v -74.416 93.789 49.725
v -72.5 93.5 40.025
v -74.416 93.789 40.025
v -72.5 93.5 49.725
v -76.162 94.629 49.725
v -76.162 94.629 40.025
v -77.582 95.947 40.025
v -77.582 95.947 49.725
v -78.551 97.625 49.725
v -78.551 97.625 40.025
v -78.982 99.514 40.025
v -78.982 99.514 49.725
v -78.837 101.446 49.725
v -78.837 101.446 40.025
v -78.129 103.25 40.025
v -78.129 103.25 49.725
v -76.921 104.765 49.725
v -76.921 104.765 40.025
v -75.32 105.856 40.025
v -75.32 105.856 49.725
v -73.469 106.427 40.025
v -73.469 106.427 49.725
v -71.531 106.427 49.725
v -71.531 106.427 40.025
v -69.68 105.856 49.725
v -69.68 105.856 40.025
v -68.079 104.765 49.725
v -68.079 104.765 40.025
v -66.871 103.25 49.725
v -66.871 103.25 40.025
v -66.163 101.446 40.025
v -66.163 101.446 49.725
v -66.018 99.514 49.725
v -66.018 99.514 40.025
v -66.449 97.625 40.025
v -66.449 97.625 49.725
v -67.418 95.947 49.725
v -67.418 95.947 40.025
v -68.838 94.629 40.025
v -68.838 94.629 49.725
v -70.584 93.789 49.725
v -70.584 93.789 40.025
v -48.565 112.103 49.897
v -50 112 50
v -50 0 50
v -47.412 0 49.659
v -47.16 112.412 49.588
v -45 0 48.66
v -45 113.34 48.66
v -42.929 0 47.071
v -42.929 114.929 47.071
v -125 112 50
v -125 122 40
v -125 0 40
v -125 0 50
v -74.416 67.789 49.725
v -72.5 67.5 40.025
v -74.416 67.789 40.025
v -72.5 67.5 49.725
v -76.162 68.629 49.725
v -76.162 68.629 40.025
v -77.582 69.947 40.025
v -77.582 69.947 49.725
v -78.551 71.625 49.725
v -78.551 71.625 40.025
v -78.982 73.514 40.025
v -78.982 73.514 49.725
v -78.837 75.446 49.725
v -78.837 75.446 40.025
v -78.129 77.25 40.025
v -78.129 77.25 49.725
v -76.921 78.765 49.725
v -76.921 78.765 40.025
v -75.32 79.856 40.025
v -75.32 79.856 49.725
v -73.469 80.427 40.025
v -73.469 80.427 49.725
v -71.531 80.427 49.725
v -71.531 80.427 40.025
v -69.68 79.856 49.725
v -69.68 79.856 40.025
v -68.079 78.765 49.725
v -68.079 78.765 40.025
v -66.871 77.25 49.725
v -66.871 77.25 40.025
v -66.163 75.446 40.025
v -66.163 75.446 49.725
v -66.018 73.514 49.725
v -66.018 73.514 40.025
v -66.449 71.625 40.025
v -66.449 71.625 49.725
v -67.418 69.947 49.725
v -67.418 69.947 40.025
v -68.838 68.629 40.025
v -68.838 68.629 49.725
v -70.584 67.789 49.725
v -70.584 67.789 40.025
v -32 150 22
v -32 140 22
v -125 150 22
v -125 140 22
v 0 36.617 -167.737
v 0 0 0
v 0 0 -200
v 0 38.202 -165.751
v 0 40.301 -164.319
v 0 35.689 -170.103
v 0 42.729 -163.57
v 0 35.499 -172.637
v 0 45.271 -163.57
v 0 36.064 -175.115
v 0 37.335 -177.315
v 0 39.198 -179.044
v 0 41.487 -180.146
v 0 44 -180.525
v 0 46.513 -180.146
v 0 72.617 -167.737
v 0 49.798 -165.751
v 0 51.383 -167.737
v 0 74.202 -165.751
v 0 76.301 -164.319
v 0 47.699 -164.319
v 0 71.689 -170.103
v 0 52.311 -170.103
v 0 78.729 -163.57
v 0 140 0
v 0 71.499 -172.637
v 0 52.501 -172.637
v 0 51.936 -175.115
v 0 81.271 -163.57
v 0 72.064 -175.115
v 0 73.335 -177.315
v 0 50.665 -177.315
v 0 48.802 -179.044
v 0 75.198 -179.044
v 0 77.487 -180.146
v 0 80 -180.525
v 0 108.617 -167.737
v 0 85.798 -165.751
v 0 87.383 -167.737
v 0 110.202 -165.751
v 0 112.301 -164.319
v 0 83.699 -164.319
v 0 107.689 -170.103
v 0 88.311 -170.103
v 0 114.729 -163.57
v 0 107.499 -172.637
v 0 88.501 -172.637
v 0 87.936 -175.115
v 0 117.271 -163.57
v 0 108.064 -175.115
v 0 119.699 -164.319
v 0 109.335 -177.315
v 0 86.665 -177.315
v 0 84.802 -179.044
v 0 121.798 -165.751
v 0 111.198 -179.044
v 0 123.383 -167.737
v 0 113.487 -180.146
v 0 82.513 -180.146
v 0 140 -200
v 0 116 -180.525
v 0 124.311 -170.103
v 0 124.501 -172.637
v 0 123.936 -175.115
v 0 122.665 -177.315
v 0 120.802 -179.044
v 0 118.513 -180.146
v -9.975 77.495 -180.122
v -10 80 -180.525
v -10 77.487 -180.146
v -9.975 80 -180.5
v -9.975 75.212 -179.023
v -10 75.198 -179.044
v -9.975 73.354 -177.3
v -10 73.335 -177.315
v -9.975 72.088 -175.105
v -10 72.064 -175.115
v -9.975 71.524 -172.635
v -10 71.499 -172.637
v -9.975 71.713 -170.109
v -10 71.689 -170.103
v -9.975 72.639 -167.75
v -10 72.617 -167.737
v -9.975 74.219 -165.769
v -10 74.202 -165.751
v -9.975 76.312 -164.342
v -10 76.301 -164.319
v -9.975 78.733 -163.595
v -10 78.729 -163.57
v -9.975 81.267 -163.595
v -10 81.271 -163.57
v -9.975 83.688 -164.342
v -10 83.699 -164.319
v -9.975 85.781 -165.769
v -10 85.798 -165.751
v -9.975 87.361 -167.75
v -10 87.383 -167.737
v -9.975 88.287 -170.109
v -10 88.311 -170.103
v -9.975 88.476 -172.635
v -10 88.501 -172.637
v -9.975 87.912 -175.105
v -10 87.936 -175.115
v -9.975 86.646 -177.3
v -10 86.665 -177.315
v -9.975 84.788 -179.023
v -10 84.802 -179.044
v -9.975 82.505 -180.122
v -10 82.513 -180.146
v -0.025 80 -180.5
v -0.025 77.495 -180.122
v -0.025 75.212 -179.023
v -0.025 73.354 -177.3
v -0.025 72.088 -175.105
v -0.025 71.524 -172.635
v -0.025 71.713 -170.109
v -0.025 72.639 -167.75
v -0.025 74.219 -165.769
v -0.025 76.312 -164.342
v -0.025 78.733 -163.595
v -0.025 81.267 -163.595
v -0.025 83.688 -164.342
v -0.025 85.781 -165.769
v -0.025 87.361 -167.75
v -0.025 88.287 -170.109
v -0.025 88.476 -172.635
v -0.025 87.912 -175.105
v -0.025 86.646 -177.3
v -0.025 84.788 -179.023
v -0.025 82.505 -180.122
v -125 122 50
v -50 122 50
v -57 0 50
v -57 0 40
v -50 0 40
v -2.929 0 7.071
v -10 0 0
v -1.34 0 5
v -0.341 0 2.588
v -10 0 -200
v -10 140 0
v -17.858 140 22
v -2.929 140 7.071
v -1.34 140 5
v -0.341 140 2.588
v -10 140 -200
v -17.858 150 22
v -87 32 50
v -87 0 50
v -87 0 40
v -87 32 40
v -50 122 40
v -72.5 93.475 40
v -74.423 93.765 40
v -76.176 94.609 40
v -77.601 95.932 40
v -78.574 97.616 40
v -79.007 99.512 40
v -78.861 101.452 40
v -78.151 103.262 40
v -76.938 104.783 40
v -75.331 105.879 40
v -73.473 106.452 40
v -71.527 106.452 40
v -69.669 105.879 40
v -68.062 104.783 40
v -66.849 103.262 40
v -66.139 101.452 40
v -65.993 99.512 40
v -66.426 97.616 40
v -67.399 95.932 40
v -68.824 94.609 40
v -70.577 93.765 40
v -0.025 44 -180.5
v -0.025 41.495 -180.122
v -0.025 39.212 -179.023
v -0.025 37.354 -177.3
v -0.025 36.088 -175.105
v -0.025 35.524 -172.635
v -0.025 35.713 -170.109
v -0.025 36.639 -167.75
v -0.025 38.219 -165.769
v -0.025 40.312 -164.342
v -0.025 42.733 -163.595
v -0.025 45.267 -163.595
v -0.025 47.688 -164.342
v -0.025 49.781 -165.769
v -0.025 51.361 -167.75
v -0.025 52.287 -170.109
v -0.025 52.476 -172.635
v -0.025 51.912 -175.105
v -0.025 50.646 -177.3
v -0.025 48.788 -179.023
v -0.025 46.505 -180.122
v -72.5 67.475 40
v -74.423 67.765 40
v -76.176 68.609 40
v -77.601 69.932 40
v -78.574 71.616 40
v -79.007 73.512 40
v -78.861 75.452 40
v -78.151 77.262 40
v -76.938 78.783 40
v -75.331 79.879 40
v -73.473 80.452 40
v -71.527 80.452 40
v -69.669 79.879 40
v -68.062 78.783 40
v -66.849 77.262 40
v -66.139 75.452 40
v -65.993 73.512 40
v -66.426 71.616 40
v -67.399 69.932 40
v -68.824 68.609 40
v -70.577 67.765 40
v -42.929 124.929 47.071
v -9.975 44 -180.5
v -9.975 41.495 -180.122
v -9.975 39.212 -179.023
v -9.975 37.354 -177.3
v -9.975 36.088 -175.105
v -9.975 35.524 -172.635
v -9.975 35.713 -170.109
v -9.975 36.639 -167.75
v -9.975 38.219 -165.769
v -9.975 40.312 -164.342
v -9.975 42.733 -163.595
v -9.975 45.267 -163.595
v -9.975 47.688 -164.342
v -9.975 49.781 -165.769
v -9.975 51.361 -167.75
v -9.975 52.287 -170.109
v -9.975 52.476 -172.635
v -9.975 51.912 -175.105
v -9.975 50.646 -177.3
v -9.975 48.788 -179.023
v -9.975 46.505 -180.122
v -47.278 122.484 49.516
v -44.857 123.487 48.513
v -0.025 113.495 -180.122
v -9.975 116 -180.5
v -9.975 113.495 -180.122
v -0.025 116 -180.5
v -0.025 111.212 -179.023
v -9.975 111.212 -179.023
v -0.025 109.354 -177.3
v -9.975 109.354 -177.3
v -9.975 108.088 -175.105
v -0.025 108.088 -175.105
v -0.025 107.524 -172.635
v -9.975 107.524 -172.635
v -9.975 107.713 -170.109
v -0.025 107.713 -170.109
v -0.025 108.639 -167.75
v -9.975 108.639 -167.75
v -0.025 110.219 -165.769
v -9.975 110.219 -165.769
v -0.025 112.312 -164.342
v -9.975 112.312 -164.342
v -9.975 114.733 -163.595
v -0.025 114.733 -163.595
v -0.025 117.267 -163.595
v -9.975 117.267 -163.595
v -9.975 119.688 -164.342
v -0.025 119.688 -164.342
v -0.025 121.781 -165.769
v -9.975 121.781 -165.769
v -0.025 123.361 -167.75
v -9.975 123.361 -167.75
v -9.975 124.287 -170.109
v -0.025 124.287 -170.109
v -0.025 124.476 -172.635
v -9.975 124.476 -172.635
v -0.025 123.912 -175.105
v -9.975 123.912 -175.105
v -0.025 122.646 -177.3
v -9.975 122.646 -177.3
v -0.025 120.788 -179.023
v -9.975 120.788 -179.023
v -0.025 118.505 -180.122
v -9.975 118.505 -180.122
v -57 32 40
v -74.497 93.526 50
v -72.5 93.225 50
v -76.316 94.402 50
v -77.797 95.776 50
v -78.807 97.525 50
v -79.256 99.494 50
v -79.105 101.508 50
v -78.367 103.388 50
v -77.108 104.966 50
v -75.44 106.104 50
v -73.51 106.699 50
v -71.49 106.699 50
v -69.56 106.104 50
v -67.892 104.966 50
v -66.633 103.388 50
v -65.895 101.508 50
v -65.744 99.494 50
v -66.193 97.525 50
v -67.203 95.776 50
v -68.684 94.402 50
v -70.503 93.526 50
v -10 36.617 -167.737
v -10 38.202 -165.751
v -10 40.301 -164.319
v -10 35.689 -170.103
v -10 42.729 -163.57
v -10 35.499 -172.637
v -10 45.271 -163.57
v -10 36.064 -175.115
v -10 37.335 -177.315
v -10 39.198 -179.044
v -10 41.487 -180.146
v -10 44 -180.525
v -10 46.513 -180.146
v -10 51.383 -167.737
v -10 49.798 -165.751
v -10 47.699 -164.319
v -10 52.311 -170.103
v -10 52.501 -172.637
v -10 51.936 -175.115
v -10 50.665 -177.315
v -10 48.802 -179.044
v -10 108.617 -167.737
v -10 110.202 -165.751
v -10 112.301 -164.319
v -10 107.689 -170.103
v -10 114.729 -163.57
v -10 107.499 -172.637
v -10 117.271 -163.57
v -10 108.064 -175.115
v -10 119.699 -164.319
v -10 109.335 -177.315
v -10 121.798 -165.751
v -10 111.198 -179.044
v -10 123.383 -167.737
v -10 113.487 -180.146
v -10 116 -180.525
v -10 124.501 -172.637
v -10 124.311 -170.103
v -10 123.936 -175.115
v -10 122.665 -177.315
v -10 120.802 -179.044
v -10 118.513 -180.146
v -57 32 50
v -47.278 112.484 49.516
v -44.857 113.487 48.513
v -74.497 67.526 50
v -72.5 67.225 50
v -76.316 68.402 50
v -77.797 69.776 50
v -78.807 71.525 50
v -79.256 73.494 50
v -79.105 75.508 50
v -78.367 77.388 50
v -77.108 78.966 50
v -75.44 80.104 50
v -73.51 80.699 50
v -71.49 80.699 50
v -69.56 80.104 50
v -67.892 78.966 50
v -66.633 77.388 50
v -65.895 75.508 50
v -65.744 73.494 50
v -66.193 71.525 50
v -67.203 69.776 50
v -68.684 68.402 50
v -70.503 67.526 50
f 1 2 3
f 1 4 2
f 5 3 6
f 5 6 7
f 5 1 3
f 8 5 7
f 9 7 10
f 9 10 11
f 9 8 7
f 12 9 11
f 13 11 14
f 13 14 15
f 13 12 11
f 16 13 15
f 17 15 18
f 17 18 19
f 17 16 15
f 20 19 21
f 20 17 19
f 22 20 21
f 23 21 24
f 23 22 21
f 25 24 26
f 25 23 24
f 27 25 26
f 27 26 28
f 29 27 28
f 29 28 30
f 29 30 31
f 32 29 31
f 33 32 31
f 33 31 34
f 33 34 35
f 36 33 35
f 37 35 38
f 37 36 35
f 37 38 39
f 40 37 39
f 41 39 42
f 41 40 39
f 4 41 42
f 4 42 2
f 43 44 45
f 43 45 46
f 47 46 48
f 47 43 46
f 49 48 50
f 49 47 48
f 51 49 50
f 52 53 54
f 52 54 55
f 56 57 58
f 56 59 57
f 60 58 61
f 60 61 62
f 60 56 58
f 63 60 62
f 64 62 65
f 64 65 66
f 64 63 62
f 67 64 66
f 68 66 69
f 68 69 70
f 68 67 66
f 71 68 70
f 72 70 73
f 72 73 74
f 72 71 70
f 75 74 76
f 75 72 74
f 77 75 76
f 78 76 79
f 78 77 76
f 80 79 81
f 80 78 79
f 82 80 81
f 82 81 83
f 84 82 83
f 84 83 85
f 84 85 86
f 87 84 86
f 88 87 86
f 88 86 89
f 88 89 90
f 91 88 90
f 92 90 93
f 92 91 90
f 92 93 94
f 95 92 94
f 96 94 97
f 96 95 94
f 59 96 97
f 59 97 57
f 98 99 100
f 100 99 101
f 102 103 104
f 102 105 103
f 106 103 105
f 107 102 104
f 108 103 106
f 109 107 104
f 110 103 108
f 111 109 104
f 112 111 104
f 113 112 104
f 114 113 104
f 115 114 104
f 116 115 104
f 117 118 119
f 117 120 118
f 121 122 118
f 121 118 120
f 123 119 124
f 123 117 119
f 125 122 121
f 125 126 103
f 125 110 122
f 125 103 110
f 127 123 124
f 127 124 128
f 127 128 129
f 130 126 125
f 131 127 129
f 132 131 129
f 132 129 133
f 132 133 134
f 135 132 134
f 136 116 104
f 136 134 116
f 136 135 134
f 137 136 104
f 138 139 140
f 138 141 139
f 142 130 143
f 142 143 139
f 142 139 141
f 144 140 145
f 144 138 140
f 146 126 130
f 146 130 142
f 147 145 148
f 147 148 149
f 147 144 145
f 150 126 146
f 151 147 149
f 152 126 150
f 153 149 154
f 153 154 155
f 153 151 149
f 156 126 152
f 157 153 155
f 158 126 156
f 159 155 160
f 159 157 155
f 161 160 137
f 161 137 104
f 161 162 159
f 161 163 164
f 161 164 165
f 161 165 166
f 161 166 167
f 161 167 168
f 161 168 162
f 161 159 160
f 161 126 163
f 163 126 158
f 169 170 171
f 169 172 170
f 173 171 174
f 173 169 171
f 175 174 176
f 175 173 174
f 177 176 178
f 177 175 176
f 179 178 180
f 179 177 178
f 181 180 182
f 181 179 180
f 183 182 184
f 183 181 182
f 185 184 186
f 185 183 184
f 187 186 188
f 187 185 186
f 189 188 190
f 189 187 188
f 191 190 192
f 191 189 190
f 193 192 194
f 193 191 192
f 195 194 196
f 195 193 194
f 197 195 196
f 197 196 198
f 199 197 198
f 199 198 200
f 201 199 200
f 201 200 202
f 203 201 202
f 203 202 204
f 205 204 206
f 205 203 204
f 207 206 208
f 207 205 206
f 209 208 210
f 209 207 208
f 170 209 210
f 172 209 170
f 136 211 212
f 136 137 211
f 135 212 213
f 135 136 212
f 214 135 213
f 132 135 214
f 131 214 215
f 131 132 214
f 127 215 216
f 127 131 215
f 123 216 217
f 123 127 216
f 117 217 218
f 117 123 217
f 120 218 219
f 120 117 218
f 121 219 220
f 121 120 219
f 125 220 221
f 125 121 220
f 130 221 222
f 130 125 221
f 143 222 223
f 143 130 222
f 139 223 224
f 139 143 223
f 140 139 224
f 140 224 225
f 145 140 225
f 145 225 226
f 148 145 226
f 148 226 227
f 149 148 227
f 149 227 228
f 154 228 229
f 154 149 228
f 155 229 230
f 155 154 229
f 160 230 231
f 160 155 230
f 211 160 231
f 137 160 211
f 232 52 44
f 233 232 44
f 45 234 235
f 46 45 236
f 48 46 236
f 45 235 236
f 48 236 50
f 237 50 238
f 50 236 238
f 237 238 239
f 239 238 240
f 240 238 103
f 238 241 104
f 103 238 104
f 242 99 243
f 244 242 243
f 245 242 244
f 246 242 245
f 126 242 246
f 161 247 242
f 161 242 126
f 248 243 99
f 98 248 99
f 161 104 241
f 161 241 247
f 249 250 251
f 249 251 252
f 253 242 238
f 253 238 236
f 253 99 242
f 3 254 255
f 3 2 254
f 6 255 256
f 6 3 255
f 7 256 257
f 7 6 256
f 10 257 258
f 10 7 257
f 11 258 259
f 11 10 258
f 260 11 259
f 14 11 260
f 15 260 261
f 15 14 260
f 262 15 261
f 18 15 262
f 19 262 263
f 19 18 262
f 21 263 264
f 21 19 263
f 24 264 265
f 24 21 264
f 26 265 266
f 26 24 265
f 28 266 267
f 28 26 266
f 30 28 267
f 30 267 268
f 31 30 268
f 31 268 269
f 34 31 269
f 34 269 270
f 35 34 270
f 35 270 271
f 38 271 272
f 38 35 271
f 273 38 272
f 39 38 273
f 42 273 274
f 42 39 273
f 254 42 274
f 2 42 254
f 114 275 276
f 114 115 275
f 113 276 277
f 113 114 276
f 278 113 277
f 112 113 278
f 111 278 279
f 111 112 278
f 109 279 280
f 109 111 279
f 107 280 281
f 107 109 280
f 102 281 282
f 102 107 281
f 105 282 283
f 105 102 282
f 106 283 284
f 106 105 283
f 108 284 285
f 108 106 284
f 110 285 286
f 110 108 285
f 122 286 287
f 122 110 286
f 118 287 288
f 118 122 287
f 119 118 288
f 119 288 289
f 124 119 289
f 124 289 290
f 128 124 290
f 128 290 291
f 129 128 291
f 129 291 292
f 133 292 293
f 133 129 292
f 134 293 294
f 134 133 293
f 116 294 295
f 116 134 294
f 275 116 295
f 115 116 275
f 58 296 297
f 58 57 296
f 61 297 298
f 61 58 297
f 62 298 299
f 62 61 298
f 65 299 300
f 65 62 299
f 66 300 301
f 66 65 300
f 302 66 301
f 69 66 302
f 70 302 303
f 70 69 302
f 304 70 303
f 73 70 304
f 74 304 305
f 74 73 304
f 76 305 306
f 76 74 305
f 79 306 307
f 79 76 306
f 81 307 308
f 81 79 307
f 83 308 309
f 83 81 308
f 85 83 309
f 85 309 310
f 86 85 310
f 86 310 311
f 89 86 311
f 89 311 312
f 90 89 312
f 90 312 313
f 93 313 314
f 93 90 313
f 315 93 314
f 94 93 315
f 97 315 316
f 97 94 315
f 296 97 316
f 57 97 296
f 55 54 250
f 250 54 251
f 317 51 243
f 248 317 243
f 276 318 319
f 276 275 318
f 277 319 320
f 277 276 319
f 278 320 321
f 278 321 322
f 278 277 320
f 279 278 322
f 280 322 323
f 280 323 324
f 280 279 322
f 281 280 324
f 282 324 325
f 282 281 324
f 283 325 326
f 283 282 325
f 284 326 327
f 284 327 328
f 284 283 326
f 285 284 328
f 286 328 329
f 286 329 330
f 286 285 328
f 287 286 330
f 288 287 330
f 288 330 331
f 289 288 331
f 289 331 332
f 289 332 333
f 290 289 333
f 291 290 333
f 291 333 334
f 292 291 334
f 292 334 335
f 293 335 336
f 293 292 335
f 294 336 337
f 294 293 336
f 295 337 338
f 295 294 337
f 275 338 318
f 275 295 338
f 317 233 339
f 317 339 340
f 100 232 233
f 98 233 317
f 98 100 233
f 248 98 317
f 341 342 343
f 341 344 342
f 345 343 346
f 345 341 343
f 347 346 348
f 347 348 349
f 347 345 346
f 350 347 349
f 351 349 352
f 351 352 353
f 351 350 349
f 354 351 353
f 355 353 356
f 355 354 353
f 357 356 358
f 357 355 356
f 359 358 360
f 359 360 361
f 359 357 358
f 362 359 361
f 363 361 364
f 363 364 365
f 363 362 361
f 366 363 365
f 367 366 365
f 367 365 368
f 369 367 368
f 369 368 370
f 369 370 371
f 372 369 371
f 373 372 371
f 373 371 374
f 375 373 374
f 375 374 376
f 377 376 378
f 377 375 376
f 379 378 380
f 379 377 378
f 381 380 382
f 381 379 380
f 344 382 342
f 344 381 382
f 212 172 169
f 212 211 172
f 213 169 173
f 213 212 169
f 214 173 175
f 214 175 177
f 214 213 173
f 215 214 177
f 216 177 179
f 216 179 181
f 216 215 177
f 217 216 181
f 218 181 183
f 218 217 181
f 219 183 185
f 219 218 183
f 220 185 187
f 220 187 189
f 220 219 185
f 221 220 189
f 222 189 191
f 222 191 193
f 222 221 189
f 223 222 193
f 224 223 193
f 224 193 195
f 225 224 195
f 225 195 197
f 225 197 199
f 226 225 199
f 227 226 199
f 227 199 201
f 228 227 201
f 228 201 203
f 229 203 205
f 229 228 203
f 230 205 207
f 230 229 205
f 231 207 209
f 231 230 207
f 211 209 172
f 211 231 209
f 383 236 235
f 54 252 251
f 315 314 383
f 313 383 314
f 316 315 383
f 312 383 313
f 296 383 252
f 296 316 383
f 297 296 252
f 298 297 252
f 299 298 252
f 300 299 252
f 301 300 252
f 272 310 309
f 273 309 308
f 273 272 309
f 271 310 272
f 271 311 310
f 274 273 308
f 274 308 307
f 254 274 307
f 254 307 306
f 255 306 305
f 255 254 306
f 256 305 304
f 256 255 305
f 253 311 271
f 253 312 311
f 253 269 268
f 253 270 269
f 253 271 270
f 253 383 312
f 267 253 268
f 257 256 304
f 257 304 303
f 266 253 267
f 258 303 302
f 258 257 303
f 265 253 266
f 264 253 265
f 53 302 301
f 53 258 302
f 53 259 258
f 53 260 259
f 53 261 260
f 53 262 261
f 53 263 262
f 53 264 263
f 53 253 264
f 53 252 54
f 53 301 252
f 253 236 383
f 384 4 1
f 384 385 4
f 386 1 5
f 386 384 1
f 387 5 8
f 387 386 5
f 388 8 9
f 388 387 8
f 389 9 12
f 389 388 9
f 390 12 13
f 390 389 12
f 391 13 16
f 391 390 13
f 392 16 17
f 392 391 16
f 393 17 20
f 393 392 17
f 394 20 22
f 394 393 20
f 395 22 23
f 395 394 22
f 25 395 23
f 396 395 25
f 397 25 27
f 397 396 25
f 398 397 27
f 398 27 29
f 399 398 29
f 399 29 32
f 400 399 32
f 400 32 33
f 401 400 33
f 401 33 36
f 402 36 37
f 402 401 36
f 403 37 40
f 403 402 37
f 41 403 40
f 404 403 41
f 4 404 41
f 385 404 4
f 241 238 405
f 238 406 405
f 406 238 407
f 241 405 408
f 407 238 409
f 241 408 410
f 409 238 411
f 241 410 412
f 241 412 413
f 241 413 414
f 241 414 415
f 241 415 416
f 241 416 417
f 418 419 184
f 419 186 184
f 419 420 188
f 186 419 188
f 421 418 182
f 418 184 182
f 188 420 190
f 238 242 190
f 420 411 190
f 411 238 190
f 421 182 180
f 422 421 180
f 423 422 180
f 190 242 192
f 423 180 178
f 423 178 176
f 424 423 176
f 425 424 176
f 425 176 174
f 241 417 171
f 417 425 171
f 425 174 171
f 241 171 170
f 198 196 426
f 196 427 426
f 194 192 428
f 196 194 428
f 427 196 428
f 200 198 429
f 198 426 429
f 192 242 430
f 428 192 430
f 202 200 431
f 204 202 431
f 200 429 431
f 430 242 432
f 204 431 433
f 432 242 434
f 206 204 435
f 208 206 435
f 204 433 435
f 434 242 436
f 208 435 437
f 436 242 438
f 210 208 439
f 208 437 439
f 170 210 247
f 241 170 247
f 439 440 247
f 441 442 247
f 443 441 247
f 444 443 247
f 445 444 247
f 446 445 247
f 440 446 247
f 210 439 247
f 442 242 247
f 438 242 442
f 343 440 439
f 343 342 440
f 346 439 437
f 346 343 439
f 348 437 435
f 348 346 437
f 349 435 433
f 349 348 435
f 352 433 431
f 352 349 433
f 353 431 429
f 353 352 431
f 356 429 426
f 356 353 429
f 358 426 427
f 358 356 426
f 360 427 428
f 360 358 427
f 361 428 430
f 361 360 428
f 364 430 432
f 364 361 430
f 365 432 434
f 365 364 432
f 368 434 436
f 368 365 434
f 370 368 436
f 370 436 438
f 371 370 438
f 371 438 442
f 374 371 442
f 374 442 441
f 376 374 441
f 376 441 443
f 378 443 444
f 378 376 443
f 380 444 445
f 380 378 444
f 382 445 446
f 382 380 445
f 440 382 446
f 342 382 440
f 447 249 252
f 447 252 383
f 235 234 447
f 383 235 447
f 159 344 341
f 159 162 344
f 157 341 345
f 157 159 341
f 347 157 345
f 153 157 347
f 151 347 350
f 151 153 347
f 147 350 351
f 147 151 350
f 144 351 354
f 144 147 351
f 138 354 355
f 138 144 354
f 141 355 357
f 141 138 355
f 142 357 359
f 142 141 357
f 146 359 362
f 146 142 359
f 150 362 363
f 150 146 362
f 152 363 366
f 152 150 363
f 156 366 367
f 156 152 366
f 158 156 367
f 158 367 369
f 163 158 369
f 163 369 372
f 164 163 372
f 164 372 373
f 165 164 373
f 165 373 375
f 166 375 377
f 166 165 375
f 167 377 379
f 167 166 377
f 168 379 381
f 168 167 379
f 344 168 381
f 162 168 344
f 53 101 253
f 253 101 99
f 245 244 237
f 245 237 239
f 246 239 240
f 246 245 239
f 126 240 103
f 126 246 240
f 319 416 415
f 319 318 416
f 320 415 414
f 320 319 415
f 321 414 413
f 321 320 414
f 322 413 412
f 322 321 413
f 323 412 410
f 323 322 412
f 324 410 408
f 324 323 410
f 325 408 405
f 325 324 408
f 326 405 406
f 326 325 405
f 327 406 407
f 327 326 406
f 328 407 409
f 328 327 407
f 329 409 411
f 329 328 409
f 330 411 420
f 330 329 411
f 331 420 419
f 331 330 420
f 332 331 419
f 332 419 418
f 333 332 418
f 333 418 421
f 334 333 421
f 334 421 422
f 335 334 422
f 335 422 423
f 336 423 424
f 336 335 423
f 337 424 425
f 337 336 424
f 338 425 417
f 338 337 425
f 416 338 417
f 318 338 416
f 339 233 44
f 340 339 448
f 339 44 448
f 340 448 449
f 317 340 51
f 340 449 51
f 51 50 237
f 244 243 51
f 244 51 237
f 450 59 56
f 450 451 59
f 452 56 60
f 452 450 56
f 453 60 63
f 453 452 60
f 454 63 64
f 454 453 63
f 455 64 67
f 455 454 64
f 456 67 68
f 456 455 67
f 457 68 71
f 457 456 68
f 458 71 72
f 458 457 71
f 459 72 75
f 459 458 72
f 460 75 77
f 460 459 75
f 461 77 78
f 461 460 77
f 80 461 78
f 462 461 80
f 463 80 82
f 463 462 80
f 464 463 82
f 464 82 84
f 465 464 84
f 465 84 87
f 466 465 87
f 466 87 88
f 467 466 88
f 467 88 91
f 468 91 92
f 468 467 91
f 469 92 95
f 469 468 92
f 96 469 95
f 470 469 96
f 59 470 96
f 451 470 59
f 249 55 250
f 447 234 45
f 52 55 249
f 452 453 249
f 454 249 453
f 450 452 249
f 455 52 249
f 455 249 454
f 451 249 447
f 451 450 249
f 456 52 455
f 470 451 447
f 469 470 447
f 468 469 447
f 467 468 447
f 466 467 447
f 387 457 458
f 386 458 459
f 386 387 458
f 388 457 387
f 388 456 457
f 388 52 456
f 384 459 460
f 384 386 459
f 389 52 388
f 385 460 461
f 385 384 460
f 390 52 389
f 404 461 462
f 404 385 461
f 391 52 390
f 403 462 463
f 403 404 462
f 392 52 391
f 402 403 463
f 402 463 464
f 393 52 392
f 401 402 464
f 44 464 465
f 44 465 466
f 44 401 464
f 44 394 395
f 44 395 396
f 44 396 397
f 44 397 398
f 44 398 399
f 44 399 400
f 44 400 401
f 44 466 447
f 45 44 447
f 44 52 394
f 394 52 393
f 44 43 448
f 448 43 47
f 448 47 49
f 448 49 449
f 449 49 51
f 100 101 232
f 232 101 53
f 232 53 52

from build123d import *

# Parameters (mm, degrees)
ESBO_O15_W                        = 200
ESBO_O15_H                        = 140
FLANGE_BASE3_DEPTH                = 10
RESSALTO_EXTRUS_O3_DEPTH          = 140
CORTE_EXTRUS_O1_DEPTH             = 275.271763038
ESBO_O29_W                        = 30
ESBO_O29_H                        = 32
CORTE_EXTRUS_O2_DEPTH             = 313.609980647
FURO_COM_FOLGA_DE_M121_AT_2_COUNT = 2
FURO_COM_FOLGA_DE_M121_AT_2_PITCH = 26
RESSALTO_EXTRUS_O4_DEPTH          = 10
FURO_COM_FOLGA_DE_M161_AT_2_COUNT = 2
FURO_COM_FOLGA_DE_M161_AT_2_PITCH = 36
FURO_COM_FOLGA_DE_M161_AT_3_COUNT = 2
FURO_COM_FOLGA_DE_M161_AT_3_PITCH = 72


# Sheet-metal steps are written as plain solids
with BuildPart() as part:
    # Esboço15 → Flange-base3 (new body)
    with BuildSketch(Plane(origin=(0, 0, 0), x_dir=(0, 0, -1), z_dir=(1, 0, 0))):
        with Locations((100, 70)):
            Rectangle(ESBO_O15_W, ESBO_O15_H)
    extrude(amount=-FLANGE_BASE3_DEPTH)

    # Esboço22 → Ressalto-extrusão3 (add)
    with BuildSketch(Plane(origin=(0, 140, 0), x_dir=(1, 0, 0), z_dir=(0, 1, 0))):
        with BuildLine():
            Line((-10, 0), (-50, -40))
            Line((-50, -40), (-125, -40))
            Line((-125, -40), (-125, -50))
            Line((-125, -50), (-50, -50))
            ThreePointArc((-50, -50), (-46.173165676, -49.238795325), (-42.928932188, -47.071067812))
            Line((-42.928932188, -47.071067812), (-2.928932188, -7.071067812))
            ThreePointArc((-2.928932188, -7.071067812), (-0.761204675, -3.826834324), (0, 0))
            Line((0, 0), (-10, 0))
        make_face()
    extrude(amount=-RESSALTO_EXTRUS_O3_DEPTH)

    # Esboço28 → Corte-extrusão1 (cut, through all)
    with BuildSketch(Plane(origin=(0, 0, 0), x_dir=(0, 0, -1), z_dir=(1, 0, 0))):
        Polygon((-40, 122), (-22, 140), (-40, 140), (-50, 140), (-50, 112), align=None)
    extrude(amount=-CORTE_EXTRUS_O1_DEPTH, mode=Mode.SUBTRACT)

    # Esboço29 → Corte-extrusão2 (cut, through all)
    with BuildSketch(Plane.XY.offset(50)):
        with Locations((-72, 16)):
            Rectangle(ESBO_O29_W, ESBO_O29_H)
    extrude(amount=-CORTE_EXTRUS_O2_DEPTH, mode=Mode.SUBTRACT)

    # Esboço32 → Furo com folga de M121 (revolve, cut)
    with BuildSketch(Plane(origin=(-72.5, 100, 50), x_dir=(0, -1, 0), z_dir=(1, 0, 0))):
        Polygon((0, 0), (0, 10), (6.525, 10), (6.5, 9.975), (6.5, 0.275), (6.775, 0), align=None)
    furo_com_folga_de_m121 = revolve(axis=Axis((-72.5, 100, 56.35), (0, 0, -1)), mode=Mode.SUBTRACT)

    # Furo com folga de M121 at 2: Furo com folga de M121 ×2
    with Locations(*[(0, -i * FURO_COM_FOLGA_DE_M121_AT_2_PITCH, 0) for i in range(1, FURO_COM_FOLGA_DE_M121_AT_2_COUNT)]):
        add(furo_com_folga_de_m121, mode=Mode.SUBTRACT)

    # 3DSketch1 → Ressalto-extrusão4 (add, along a direction that is not the sketch's normal)
    with BuildSketch(Plane(origin=(-32, 140, 22), x_dir=(-0.9200708084976427, -0.27701056599928864, 0.2770105659992915), z_dir=(0, -0.7071067811865503, -0.7071067811865448))):
        with BuildLine():
            Line((0, 0), (85.56658519, 36.43294524))
            Line((85.56658519, 36.43294524), (101.079176886, 0))
            Line((101.079176886, 0), (32.073866249, -29.381407452))
            ThreePointArc((32.073866249, -29.381407452), (27.897170232, -29.738711394), (23.945292844, -28.34045504))
            Line((23.945292844, -28.34045504), (-13.011766157, -5.54021132))
            Line((-13.011766157, -5.54021132), (0, 0))
        make_face()
    extrude(amount=-RESSALTO_EXTRUS_O4_DEPTH, dir=(0, -1, 0))

    # Esboço33 → Furo com folga de M161 (revolve, cut)
    with BuildSketch(Plane(origin=(0, 116, -172), x_dir=(0, 0, -1), z_dir=(0, 1, 0))):
        Polygon((0, 0), (0, 10), (8.525, 10), (8.5, 9.975), (8.5, 0.025), (8.525, 0), align=None)
    furo_com_folga_de_m161 = revolve(axis=Axis((6.35, 116, -172), (-1, 0, 0)), mode=Mode.SUBTRACT)

    # Furo com folga de M161 at 2: Furo com folga de M161 ×2
    with Locations(*[(0, -i * FURO_COM_FOLGA_DE_M161_AT_2_PITCH, 0) for i in range(1, FURO_COM_FOLGA_DE_M161_AT_2_COUNT)]):
        add(furo_com_folga_de_m161, mode=Mode.SUBTRACT)

    # Furo com folga de M161 at 3: Furo com folga de M161 ×2
    with Locations(*[(0, -i * FURO_COM_FOLGA_DE_M161_AT_3_PITCH, 0) for i in range(1, FURO_COM_FOLGA_DE_M161_AT_3_COUNT)]):
        add(furo_com_folga_de_m161, mode=Mode.SUBTRACT)


solid = part.part
